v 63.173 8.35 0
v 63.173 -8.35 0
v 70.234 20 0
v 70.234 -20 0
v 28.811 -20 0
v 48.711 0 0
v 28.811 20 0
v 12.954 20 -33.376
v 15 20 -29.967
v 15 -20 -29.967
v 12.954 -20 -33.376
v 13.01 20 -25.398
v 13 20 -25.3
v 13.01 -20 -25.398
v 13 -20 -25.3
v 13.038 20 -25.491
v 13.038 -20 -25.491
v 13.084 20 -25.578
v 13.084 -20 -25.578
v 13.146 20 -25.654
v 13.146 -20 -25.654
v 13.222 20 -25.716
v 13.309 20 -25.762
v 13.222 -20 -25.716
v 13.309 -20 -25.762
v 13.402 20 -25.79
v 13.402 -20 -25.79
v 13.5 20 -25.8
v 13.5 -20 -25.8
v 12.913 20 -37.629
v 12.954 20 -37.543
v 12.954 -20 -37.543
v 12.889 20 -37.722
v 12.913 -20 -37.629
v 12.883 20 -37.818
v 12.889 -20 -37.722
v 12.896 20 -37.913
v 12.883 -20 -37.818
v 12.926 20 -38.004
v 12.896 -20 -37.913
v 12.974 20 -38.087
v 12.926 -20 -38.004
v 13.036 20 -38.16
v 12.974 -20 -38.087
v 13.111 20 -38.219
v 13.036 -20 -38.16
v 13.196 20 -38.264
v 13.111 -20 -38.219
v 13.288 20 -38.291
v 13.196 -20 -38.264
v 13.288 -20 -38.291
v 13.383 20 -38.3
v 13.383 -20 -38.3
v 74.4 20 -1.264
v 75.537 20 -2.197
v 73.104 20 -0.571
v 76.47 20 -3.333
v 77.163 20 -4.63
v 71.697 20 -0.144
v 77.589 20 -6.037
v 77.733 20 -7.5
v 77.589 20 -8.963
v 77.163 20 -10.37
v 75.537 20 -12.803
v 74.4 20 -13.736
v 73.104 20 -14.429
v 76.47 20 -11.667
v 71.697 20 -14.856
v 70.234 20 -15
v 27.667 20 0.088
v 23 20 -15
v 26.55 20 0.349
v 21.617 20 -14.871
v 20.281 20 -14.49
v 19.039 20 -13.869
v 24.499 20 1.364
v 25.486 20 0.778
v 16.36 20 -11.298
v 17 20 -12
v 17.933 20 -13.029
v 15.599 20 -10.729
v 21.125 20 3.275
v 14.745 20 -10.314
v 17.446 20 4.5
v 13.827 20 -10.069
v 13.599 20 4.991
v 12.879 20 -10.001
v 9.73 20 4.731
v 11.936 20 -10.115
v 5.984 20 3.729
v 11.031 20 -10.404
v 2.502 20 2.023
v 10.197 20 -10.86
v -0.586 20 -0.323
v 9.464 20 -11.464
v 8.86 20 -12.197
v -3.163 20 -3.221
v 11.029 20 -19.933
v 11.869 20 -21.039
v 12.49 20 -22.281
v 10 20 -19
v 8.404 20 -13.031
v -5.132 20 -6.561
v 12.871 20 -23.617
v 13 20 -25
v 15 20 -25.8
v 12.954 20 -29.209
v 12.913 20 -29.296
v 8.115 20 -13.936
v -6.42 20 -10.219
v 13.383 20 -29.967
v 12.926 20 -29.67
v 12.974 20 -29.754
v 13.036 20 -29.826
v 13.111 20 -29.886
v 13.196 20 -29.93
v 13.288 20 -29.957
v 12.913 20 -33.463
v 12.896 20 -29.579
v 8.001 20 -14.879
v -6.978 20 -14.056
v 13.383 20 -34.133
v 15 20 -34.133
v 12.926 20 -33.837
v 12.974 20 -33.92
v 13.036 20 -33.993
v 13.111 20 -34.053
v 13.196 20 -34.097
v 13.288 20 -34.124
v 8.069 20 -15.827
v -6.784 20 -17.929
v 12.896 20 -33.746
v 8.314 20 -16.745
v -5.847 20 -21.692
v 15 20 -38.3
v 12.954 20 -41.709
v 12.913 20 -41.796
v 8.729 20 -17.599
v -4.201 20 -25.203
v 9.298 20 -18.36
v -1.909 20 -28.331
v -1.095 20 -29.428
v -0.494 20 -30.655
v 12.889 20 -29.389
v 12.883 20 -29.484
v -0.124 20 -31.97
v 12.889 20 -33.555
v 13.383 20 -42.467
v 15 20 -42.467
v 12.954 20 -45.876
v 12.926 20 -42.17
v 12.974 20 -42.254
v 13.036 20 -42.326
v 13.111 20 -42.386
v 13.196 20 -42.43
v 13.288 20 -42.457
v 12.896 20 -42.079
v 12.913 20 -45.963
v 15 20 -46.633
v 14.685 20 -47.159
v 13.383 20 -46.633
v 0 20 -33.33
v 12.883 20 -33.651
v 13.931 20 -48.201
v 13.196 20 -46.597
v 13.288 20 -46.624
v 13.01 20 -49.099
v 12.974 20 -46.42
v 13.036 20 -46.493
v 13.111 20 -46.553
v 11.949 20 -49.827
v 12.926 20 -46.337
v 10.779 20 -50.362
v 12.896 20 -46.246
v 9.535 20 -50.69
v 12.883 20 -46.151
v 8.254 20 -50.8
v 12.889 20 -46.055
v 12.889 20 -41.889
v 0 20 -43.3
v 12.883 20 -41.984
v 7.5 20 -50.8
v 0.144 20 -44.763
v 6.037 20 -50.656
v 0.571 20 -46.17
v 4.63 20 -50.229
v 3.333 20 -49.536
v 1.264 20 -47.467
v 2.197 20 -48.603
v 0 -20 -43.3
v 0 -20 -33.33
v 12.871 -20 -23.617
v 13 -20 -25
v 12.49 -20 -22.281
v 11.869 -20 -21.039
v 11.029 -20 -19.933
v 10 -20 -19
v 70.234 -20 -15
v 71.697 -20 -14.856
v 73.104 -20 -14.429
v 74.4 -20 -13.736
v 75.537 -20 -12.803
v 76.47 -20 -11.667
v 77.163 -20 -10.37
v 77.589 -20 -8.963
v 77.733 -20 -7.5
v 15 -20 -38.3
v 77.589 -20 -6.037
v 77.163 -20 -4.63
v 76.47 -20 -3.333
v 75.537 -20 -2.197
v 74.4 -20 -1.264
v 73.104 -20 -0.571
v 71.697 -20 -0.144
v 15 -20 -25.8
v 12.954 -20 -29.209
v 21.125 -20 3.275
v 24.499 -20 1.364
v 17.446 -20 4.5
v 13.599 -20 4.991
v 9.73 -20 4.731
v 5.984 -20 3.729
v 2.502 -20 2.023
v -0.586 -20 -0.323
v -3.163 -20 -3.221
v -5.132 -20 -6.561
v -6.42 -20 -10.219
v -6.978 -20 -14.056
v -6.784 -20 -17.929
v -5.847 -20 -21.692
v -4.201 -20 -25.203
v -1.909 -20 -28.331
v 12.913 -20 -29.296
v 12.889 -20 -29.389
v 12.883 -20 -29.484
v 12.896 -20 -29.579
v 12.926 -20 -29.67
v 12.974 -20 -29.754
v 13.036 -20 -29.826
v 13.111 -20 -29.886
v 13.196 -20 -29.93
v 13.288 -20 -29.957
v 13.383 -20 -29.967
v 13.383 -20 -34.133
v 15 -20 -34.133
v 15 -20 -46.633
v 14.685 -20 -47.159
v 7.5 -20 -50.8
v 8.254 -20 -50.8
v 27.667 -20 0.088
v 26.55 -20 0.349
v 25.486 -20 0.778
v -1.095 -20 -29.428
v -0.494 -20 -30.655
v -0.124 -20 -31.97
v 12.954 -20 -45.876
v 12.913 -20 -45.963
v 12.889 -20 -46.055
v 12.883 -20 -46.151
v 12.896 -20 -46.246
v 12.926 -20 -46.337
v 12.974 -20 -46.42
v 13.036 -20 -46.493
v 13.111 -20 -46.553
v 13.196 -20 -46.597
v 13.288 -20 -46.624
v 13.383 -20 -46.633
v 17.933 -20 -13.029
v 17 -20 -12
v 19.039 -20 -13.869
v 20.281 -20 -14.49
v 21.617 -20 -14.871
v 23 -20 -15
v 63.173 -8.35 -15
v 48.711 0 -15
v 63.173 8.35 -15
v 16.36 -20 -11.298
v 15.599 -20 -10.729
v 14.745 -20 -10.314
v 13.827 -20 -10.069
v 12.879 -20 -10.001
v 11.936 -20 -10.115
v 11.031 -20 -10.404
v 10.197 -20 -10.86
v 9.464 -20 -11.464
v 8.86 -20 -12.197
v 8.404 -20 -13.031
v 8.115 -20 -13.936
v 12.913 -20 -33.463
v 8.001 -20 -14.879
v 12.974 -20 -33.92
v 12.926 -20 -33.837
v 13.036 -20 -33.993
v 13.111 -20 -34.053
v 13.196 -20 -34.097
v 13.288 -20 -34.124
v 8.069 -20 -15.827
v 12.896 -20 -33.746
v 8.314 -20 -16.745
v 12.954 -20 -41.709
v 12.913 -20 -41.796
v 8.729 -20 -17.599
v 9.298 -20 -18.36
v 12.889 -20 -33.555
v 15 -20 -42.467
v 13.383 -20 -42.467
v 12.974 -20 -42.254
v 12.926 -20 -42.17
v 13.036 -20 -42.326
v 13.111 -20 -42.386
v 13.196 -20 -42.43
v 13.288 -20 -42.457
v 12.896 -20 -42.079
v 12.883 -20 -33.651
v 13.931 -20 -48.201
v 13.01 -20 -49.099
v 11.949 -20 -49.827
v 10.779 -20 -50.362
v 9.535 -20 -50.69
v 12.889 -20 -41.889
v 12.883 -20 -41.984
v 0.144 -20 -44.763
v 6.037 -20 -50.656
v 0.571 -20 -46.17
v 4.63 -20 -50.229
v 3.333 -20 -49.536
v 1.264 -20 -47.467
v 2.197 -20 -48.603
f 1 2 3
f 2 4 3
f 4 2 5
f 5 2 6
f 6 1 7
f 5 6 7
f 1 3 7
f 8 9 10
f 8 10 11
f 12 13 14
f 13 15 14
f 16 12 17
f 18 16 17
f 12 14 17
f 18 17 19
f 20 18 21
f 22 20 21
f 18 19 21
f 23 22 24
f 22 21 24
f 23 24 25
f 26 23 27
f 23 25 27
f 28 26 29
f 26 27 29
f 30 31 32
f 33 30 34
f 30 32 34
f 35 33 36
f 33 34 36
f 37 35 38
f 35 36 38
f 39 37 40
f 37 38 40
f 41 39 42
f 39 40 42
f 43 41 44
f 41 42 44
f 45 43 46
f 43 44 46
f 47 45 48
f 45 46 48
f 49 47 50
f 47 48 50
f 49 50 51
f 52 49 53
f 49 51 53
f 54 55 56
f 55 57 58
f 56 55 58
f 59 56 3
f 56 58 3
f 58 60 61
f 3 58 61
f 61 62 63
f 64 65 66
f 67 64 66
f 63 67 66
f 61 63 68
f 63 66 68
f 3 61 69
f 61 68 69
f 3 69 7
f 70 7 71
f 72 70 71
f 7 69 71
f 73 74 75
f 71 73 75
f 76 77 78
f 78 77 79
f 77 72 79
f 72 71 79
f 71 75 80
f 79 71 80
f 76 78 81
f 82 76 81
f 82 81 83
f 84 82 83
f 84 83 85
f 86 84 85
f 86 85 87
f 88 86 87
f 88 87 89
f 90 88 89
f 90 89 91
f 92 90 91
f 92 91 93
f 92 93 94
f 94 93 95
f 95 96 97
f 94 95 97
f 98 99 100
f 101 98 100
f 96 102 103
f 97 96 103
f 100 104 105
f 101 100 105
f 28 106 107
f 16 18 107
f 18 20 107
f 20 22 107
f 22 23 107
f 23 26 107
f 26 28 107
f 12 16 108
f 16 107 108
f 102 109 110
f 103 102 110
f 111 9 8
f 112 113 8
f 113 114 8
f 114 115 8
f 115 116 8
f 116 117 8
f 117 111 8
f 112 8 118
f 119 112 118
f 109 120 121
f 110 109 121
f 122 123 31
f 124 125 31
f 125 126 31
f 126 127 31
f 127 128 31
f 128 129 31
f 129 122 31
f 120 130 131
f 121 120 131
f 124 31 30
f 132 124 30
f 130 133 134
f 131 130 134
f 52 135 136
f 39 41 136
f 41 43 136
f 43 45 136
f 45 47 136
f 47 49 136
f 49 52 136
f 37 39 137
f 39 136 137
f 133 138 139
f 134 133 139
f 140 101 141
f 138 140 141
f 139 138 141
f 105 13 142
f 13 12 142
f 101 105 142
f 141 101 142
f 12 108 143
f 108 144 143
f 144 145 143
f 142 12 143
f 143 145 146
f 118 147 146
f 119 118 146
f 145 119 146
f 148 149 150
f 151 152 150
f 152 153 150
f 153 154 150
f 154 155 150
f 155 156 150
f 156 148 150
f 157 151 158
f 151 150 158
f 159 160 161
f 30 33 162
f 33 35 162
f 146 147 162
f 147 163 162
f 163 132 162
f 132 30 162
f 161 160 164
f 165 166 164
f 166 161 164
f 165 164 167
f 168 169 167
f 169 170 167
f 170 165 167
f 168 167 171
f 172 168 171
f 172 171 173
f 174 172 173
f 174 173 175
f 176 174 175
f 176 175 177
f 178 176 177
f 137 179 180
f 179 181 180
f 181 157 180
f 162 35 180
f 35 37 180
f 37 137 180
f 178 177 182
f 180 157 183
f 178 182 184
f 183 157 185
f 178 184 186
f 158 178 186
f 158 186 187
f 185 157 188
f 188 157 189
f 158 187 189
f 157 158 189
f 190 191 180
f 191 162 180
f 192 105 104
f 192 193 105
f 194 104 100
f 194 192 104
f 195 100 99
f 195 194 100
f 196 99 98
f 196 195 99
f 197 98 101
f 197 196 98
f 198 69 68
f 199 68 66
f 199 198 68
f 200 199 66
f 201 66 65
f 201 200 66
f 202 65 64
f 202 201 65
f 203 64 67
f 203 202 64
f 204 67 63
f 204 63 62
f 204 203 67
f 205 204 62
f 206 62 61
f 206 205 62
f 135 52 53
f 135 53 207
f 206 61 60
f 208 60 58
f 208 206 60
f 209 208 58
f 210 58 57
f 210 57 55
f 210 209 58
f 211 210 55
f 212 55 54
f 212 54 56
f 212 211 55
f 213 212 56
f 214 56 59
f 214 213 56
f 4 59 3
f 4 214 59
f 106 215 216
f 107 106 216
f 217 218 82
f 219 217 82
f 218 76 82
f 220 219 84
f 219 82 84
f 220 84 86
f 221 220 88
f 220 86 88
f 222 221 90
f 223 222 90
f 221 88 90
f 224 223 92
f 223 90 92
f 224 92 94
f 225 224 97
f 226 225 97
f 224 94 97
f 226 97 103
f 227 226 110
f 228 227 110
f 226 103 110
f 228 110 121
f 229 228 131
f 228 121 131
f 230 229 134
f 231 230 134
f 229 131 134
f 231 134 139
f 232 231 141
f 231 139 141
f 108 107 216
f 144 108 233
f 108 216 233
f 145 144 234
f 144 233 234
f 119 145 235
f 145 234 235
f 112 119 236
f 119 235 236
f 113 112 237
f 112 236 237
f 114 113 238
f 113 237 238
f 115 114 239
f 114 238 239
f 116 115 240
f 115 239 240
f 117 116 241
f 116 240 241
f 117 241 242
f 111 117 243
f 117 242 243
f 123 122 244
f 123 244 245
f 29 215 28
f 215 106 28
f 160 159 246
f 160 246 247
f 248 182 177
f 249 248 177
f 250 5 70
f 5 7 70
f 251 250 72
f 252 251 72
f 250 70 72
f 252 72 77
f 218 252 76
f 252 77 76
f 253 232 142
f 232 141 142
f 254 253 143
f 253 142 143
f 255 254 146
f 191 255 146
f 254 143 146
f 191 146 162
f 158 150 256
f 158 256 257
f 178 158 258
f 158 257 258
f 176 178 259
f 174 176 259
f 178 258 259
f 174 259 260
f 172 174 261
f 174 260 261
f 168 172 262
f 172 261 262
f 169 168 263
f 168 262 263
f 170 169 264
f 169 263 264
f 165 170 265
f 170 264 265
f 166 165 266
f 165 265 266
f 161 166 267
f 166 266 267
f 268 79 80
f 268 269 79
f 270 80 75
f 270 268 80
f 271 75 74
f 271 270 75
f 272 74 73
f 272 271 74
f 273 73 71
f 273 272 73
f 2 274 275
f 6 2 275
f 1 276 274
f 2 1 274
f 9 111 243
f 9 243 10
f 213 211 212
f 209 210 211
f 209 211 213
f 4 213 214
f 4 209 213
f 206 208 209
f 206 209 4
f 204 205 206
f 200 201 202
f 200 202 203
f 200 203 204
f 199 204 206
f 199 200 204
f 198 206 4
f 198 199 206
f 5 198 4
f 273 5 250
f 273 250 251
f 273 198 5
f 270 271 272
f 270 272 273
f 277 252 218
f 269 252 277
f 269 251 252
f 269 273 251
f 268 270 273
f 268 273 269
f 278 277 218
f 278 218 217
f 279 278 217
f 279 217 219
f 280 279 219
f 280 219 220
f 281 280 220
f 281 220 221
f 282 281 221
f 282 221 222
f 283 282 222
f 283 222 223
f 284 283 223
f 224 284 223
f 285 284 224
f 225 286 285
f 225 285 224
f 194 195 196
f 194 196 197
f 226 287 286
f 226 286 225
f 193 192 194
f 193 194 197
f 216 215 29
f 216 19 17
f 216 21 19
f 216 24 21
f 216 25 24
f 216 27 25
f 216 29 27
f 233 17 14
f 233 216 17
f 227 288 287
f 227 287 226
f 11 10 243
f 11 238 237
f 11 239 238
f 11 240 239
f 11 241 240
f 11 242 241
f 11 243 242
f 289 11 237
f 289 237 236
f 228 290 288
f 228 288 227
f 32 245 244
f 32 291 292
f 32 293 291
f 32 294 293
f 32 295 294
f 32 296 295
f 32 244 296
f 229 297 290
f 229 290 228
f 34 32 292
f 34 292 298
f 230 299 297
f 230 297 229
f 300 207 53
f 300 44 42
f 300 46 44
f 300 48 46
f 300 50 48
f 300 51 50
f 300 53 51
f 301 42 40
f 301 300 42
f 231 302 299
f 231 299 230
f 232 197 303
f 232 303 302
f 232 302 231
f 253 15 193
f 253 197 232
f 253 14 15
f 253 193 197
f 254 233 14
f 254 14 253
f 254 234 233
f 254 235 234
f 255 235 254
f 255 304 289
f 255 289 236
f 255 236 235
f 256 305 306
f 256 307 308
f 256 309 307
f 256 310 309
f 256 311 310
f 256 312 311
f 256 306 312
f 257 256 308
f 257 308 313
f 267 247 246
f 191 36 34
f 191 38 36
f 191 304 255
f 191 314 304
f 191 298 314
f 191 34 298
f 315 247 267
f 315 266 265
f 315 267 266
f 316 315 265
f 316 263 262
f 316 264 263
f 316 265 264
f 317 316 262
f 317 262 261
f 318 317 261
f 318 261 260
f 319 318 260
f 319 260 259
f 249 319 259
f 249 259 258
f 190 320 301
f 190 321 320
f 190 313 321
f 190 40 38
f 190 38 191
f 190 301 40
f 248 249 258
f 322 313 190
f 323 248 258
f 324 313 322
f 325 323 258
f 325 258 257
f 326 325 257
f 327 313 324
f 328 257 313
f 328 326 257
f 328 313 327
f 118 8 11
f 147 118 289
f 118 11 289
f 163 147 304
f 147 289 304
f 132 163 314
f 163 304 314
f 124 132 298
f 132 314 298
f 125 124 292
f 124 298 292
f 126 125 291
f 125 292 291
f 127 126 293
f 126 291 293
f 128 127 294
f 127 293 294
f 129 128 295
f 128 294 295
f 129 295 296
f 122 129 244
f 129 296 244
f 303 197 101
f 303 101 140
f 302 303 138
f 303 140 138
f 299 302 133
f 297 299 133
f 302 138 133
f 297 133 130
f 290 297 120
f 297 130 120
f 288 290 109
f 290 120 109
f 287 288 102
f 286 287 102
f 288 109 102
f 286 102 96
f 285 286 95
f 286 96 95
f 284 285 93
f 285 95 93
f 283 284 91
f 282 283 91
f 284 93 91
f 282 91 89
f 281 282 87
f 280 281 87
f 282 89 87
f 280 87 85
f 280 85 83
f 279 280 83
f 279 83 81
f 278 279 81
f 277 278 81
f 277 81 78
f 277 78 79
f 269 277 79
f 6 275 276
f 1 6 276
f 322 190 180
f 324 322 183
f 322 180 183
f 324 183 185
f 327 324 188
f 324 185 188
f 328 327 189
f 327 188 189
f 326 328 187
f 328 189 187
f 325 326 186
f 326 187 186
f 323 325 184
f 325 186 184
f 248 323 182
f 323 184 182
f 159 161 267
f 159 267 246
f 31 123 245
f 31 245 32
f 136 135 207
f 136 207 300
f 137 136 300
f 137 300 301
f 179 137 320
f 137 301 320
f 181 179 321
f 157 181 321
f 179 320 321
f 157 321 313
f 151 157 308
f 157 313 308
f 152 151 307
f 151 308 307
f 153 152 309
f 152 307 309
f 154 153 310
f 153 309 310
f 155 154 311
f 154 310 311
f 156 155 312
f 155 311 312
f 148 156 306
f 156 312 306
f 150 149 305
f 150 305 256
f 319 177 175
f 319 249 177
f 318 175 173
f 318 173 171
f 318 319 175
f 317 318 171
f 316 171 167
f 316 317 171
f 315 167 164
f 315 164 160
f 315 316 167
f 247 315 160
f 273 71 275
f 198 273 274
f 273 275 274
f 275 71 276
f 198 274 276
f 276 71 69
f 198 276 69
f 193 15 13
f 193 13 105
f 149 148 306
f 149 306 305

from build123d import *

# Parameters (mm, degrees)
BOSS_EXTRUDE1_DEPTH = 20
CUT_EXTRUDE1_DEPTH  = 88.887054459
CUT_EXTRUDE2_DEPTH  = 102.109516572
LPATTERN1_COUNT     = 6
LPATTERN1_PITCH     = 4.166666667
FILLET1_R           = 0.5
FILLET2_R           = 7.5


with BuildPart() as part:
    # Sketch1 → Boss-Extrude1 (new, symmetric)
    with BuildSketch(Plane(origin=(0, 0, 0), x_dir=(1, 0, 0), z_dir=(0, 1, 0))):
        with BuildLine():
            Line((0, 50.8), (15, 50.8))
            Line((15, 50.8), (15, 25.8))
            Line((15, 25.8), (13, 25.8))
            Line((13, 25.8), (13, 20))
            ThreePointArc((13, 20), (9.464466094, 11.464466094), (18, 15))
            Line((18, 15), (77.733482757, 15))
            Line((77.733482757, 15), (77.733482757, 0))
            Line((77.733482757, 0), (26.228756555, 0))
            ThreePointArc((26.228756555, 0), (-2.099775281, 1.885245467), (0, 30.198684154))
            Line((0, 30.198684154), (0, 50.8))
        make_face()
    extrude(amount=BOSS_EXTRUDE1_DEPTH, both=True)

    # Sketch2 → Cut-Extrude1 (cut, through all)
    with BuildSketch(Plane(origin=(0, 0, -15), x_dir=(-1, 0, 0), z_dir=(0, 0, -1))):
        Polygon((-48.710580838, 0), (-63.173205081, 8.35), (-63.173205081, -8.35), align=None)
    extrude(amount=-CUT_EXTRUDE1_DEPTH, mode=Mode.SUBTRACT)

    # Sketch3 → Cut-Extrude2 (cut, through all)
    with BuildSketch(Plane(origin=(0, 20, 0), x_dir=(1, 0, 0), z_dir=(0, 1, 0))):
        Polygon((15, 25.8), (12.5, 29.966666667), (15, 29.966666667), align=None)
    cut_extrude2 = extrude(amount=-CUT_EXTRUDE2_DEPTH, mode=Mode.SUBTRACT)

    # LPattern1: Cut-Extrude2 ×6
    with Locations(*[(0, 0, -i * LPATTERN1_PITCH) for i in range(1, LPATTERN1_COUNT)]):
        add(cut_extrude2, mode=Mode.SUBTRACT)

    # Fillet1
    fillet1_edges = [part.edges().sort_by_distance(p)[0] for p in [
        (12.5, 0, -46.633333333),
        (13, 0, -25.8),
        (12.5, 0, -29.966666667),
        (12.5, 0, -34.133333333),
        (12.5, 0, -42.466666667),
        (12.5, 0, -38.3),
    ]]
    fillet(fillet1_edges, radius=FILLET1_R)

    # Fillet2
    fillet2_edges = [part.edges().sort_by_distance(p)[0] for p in [
        (12.5, 0, -50.8),
        (77.733482757, 0, -15),
        (77.733482757, 0, 0),
        (26.228756555, 0, 0),
        (0, 0, -30.198684154),
        (0, 0, -50.8),
        (13, 0, -20),
        (18, 0, -15),
    ]]
    fillet(fillet2_edges, radius=FILLET2_R - 0.0001)  # a hair under: the kernel refuses the full size


solid = part.part
